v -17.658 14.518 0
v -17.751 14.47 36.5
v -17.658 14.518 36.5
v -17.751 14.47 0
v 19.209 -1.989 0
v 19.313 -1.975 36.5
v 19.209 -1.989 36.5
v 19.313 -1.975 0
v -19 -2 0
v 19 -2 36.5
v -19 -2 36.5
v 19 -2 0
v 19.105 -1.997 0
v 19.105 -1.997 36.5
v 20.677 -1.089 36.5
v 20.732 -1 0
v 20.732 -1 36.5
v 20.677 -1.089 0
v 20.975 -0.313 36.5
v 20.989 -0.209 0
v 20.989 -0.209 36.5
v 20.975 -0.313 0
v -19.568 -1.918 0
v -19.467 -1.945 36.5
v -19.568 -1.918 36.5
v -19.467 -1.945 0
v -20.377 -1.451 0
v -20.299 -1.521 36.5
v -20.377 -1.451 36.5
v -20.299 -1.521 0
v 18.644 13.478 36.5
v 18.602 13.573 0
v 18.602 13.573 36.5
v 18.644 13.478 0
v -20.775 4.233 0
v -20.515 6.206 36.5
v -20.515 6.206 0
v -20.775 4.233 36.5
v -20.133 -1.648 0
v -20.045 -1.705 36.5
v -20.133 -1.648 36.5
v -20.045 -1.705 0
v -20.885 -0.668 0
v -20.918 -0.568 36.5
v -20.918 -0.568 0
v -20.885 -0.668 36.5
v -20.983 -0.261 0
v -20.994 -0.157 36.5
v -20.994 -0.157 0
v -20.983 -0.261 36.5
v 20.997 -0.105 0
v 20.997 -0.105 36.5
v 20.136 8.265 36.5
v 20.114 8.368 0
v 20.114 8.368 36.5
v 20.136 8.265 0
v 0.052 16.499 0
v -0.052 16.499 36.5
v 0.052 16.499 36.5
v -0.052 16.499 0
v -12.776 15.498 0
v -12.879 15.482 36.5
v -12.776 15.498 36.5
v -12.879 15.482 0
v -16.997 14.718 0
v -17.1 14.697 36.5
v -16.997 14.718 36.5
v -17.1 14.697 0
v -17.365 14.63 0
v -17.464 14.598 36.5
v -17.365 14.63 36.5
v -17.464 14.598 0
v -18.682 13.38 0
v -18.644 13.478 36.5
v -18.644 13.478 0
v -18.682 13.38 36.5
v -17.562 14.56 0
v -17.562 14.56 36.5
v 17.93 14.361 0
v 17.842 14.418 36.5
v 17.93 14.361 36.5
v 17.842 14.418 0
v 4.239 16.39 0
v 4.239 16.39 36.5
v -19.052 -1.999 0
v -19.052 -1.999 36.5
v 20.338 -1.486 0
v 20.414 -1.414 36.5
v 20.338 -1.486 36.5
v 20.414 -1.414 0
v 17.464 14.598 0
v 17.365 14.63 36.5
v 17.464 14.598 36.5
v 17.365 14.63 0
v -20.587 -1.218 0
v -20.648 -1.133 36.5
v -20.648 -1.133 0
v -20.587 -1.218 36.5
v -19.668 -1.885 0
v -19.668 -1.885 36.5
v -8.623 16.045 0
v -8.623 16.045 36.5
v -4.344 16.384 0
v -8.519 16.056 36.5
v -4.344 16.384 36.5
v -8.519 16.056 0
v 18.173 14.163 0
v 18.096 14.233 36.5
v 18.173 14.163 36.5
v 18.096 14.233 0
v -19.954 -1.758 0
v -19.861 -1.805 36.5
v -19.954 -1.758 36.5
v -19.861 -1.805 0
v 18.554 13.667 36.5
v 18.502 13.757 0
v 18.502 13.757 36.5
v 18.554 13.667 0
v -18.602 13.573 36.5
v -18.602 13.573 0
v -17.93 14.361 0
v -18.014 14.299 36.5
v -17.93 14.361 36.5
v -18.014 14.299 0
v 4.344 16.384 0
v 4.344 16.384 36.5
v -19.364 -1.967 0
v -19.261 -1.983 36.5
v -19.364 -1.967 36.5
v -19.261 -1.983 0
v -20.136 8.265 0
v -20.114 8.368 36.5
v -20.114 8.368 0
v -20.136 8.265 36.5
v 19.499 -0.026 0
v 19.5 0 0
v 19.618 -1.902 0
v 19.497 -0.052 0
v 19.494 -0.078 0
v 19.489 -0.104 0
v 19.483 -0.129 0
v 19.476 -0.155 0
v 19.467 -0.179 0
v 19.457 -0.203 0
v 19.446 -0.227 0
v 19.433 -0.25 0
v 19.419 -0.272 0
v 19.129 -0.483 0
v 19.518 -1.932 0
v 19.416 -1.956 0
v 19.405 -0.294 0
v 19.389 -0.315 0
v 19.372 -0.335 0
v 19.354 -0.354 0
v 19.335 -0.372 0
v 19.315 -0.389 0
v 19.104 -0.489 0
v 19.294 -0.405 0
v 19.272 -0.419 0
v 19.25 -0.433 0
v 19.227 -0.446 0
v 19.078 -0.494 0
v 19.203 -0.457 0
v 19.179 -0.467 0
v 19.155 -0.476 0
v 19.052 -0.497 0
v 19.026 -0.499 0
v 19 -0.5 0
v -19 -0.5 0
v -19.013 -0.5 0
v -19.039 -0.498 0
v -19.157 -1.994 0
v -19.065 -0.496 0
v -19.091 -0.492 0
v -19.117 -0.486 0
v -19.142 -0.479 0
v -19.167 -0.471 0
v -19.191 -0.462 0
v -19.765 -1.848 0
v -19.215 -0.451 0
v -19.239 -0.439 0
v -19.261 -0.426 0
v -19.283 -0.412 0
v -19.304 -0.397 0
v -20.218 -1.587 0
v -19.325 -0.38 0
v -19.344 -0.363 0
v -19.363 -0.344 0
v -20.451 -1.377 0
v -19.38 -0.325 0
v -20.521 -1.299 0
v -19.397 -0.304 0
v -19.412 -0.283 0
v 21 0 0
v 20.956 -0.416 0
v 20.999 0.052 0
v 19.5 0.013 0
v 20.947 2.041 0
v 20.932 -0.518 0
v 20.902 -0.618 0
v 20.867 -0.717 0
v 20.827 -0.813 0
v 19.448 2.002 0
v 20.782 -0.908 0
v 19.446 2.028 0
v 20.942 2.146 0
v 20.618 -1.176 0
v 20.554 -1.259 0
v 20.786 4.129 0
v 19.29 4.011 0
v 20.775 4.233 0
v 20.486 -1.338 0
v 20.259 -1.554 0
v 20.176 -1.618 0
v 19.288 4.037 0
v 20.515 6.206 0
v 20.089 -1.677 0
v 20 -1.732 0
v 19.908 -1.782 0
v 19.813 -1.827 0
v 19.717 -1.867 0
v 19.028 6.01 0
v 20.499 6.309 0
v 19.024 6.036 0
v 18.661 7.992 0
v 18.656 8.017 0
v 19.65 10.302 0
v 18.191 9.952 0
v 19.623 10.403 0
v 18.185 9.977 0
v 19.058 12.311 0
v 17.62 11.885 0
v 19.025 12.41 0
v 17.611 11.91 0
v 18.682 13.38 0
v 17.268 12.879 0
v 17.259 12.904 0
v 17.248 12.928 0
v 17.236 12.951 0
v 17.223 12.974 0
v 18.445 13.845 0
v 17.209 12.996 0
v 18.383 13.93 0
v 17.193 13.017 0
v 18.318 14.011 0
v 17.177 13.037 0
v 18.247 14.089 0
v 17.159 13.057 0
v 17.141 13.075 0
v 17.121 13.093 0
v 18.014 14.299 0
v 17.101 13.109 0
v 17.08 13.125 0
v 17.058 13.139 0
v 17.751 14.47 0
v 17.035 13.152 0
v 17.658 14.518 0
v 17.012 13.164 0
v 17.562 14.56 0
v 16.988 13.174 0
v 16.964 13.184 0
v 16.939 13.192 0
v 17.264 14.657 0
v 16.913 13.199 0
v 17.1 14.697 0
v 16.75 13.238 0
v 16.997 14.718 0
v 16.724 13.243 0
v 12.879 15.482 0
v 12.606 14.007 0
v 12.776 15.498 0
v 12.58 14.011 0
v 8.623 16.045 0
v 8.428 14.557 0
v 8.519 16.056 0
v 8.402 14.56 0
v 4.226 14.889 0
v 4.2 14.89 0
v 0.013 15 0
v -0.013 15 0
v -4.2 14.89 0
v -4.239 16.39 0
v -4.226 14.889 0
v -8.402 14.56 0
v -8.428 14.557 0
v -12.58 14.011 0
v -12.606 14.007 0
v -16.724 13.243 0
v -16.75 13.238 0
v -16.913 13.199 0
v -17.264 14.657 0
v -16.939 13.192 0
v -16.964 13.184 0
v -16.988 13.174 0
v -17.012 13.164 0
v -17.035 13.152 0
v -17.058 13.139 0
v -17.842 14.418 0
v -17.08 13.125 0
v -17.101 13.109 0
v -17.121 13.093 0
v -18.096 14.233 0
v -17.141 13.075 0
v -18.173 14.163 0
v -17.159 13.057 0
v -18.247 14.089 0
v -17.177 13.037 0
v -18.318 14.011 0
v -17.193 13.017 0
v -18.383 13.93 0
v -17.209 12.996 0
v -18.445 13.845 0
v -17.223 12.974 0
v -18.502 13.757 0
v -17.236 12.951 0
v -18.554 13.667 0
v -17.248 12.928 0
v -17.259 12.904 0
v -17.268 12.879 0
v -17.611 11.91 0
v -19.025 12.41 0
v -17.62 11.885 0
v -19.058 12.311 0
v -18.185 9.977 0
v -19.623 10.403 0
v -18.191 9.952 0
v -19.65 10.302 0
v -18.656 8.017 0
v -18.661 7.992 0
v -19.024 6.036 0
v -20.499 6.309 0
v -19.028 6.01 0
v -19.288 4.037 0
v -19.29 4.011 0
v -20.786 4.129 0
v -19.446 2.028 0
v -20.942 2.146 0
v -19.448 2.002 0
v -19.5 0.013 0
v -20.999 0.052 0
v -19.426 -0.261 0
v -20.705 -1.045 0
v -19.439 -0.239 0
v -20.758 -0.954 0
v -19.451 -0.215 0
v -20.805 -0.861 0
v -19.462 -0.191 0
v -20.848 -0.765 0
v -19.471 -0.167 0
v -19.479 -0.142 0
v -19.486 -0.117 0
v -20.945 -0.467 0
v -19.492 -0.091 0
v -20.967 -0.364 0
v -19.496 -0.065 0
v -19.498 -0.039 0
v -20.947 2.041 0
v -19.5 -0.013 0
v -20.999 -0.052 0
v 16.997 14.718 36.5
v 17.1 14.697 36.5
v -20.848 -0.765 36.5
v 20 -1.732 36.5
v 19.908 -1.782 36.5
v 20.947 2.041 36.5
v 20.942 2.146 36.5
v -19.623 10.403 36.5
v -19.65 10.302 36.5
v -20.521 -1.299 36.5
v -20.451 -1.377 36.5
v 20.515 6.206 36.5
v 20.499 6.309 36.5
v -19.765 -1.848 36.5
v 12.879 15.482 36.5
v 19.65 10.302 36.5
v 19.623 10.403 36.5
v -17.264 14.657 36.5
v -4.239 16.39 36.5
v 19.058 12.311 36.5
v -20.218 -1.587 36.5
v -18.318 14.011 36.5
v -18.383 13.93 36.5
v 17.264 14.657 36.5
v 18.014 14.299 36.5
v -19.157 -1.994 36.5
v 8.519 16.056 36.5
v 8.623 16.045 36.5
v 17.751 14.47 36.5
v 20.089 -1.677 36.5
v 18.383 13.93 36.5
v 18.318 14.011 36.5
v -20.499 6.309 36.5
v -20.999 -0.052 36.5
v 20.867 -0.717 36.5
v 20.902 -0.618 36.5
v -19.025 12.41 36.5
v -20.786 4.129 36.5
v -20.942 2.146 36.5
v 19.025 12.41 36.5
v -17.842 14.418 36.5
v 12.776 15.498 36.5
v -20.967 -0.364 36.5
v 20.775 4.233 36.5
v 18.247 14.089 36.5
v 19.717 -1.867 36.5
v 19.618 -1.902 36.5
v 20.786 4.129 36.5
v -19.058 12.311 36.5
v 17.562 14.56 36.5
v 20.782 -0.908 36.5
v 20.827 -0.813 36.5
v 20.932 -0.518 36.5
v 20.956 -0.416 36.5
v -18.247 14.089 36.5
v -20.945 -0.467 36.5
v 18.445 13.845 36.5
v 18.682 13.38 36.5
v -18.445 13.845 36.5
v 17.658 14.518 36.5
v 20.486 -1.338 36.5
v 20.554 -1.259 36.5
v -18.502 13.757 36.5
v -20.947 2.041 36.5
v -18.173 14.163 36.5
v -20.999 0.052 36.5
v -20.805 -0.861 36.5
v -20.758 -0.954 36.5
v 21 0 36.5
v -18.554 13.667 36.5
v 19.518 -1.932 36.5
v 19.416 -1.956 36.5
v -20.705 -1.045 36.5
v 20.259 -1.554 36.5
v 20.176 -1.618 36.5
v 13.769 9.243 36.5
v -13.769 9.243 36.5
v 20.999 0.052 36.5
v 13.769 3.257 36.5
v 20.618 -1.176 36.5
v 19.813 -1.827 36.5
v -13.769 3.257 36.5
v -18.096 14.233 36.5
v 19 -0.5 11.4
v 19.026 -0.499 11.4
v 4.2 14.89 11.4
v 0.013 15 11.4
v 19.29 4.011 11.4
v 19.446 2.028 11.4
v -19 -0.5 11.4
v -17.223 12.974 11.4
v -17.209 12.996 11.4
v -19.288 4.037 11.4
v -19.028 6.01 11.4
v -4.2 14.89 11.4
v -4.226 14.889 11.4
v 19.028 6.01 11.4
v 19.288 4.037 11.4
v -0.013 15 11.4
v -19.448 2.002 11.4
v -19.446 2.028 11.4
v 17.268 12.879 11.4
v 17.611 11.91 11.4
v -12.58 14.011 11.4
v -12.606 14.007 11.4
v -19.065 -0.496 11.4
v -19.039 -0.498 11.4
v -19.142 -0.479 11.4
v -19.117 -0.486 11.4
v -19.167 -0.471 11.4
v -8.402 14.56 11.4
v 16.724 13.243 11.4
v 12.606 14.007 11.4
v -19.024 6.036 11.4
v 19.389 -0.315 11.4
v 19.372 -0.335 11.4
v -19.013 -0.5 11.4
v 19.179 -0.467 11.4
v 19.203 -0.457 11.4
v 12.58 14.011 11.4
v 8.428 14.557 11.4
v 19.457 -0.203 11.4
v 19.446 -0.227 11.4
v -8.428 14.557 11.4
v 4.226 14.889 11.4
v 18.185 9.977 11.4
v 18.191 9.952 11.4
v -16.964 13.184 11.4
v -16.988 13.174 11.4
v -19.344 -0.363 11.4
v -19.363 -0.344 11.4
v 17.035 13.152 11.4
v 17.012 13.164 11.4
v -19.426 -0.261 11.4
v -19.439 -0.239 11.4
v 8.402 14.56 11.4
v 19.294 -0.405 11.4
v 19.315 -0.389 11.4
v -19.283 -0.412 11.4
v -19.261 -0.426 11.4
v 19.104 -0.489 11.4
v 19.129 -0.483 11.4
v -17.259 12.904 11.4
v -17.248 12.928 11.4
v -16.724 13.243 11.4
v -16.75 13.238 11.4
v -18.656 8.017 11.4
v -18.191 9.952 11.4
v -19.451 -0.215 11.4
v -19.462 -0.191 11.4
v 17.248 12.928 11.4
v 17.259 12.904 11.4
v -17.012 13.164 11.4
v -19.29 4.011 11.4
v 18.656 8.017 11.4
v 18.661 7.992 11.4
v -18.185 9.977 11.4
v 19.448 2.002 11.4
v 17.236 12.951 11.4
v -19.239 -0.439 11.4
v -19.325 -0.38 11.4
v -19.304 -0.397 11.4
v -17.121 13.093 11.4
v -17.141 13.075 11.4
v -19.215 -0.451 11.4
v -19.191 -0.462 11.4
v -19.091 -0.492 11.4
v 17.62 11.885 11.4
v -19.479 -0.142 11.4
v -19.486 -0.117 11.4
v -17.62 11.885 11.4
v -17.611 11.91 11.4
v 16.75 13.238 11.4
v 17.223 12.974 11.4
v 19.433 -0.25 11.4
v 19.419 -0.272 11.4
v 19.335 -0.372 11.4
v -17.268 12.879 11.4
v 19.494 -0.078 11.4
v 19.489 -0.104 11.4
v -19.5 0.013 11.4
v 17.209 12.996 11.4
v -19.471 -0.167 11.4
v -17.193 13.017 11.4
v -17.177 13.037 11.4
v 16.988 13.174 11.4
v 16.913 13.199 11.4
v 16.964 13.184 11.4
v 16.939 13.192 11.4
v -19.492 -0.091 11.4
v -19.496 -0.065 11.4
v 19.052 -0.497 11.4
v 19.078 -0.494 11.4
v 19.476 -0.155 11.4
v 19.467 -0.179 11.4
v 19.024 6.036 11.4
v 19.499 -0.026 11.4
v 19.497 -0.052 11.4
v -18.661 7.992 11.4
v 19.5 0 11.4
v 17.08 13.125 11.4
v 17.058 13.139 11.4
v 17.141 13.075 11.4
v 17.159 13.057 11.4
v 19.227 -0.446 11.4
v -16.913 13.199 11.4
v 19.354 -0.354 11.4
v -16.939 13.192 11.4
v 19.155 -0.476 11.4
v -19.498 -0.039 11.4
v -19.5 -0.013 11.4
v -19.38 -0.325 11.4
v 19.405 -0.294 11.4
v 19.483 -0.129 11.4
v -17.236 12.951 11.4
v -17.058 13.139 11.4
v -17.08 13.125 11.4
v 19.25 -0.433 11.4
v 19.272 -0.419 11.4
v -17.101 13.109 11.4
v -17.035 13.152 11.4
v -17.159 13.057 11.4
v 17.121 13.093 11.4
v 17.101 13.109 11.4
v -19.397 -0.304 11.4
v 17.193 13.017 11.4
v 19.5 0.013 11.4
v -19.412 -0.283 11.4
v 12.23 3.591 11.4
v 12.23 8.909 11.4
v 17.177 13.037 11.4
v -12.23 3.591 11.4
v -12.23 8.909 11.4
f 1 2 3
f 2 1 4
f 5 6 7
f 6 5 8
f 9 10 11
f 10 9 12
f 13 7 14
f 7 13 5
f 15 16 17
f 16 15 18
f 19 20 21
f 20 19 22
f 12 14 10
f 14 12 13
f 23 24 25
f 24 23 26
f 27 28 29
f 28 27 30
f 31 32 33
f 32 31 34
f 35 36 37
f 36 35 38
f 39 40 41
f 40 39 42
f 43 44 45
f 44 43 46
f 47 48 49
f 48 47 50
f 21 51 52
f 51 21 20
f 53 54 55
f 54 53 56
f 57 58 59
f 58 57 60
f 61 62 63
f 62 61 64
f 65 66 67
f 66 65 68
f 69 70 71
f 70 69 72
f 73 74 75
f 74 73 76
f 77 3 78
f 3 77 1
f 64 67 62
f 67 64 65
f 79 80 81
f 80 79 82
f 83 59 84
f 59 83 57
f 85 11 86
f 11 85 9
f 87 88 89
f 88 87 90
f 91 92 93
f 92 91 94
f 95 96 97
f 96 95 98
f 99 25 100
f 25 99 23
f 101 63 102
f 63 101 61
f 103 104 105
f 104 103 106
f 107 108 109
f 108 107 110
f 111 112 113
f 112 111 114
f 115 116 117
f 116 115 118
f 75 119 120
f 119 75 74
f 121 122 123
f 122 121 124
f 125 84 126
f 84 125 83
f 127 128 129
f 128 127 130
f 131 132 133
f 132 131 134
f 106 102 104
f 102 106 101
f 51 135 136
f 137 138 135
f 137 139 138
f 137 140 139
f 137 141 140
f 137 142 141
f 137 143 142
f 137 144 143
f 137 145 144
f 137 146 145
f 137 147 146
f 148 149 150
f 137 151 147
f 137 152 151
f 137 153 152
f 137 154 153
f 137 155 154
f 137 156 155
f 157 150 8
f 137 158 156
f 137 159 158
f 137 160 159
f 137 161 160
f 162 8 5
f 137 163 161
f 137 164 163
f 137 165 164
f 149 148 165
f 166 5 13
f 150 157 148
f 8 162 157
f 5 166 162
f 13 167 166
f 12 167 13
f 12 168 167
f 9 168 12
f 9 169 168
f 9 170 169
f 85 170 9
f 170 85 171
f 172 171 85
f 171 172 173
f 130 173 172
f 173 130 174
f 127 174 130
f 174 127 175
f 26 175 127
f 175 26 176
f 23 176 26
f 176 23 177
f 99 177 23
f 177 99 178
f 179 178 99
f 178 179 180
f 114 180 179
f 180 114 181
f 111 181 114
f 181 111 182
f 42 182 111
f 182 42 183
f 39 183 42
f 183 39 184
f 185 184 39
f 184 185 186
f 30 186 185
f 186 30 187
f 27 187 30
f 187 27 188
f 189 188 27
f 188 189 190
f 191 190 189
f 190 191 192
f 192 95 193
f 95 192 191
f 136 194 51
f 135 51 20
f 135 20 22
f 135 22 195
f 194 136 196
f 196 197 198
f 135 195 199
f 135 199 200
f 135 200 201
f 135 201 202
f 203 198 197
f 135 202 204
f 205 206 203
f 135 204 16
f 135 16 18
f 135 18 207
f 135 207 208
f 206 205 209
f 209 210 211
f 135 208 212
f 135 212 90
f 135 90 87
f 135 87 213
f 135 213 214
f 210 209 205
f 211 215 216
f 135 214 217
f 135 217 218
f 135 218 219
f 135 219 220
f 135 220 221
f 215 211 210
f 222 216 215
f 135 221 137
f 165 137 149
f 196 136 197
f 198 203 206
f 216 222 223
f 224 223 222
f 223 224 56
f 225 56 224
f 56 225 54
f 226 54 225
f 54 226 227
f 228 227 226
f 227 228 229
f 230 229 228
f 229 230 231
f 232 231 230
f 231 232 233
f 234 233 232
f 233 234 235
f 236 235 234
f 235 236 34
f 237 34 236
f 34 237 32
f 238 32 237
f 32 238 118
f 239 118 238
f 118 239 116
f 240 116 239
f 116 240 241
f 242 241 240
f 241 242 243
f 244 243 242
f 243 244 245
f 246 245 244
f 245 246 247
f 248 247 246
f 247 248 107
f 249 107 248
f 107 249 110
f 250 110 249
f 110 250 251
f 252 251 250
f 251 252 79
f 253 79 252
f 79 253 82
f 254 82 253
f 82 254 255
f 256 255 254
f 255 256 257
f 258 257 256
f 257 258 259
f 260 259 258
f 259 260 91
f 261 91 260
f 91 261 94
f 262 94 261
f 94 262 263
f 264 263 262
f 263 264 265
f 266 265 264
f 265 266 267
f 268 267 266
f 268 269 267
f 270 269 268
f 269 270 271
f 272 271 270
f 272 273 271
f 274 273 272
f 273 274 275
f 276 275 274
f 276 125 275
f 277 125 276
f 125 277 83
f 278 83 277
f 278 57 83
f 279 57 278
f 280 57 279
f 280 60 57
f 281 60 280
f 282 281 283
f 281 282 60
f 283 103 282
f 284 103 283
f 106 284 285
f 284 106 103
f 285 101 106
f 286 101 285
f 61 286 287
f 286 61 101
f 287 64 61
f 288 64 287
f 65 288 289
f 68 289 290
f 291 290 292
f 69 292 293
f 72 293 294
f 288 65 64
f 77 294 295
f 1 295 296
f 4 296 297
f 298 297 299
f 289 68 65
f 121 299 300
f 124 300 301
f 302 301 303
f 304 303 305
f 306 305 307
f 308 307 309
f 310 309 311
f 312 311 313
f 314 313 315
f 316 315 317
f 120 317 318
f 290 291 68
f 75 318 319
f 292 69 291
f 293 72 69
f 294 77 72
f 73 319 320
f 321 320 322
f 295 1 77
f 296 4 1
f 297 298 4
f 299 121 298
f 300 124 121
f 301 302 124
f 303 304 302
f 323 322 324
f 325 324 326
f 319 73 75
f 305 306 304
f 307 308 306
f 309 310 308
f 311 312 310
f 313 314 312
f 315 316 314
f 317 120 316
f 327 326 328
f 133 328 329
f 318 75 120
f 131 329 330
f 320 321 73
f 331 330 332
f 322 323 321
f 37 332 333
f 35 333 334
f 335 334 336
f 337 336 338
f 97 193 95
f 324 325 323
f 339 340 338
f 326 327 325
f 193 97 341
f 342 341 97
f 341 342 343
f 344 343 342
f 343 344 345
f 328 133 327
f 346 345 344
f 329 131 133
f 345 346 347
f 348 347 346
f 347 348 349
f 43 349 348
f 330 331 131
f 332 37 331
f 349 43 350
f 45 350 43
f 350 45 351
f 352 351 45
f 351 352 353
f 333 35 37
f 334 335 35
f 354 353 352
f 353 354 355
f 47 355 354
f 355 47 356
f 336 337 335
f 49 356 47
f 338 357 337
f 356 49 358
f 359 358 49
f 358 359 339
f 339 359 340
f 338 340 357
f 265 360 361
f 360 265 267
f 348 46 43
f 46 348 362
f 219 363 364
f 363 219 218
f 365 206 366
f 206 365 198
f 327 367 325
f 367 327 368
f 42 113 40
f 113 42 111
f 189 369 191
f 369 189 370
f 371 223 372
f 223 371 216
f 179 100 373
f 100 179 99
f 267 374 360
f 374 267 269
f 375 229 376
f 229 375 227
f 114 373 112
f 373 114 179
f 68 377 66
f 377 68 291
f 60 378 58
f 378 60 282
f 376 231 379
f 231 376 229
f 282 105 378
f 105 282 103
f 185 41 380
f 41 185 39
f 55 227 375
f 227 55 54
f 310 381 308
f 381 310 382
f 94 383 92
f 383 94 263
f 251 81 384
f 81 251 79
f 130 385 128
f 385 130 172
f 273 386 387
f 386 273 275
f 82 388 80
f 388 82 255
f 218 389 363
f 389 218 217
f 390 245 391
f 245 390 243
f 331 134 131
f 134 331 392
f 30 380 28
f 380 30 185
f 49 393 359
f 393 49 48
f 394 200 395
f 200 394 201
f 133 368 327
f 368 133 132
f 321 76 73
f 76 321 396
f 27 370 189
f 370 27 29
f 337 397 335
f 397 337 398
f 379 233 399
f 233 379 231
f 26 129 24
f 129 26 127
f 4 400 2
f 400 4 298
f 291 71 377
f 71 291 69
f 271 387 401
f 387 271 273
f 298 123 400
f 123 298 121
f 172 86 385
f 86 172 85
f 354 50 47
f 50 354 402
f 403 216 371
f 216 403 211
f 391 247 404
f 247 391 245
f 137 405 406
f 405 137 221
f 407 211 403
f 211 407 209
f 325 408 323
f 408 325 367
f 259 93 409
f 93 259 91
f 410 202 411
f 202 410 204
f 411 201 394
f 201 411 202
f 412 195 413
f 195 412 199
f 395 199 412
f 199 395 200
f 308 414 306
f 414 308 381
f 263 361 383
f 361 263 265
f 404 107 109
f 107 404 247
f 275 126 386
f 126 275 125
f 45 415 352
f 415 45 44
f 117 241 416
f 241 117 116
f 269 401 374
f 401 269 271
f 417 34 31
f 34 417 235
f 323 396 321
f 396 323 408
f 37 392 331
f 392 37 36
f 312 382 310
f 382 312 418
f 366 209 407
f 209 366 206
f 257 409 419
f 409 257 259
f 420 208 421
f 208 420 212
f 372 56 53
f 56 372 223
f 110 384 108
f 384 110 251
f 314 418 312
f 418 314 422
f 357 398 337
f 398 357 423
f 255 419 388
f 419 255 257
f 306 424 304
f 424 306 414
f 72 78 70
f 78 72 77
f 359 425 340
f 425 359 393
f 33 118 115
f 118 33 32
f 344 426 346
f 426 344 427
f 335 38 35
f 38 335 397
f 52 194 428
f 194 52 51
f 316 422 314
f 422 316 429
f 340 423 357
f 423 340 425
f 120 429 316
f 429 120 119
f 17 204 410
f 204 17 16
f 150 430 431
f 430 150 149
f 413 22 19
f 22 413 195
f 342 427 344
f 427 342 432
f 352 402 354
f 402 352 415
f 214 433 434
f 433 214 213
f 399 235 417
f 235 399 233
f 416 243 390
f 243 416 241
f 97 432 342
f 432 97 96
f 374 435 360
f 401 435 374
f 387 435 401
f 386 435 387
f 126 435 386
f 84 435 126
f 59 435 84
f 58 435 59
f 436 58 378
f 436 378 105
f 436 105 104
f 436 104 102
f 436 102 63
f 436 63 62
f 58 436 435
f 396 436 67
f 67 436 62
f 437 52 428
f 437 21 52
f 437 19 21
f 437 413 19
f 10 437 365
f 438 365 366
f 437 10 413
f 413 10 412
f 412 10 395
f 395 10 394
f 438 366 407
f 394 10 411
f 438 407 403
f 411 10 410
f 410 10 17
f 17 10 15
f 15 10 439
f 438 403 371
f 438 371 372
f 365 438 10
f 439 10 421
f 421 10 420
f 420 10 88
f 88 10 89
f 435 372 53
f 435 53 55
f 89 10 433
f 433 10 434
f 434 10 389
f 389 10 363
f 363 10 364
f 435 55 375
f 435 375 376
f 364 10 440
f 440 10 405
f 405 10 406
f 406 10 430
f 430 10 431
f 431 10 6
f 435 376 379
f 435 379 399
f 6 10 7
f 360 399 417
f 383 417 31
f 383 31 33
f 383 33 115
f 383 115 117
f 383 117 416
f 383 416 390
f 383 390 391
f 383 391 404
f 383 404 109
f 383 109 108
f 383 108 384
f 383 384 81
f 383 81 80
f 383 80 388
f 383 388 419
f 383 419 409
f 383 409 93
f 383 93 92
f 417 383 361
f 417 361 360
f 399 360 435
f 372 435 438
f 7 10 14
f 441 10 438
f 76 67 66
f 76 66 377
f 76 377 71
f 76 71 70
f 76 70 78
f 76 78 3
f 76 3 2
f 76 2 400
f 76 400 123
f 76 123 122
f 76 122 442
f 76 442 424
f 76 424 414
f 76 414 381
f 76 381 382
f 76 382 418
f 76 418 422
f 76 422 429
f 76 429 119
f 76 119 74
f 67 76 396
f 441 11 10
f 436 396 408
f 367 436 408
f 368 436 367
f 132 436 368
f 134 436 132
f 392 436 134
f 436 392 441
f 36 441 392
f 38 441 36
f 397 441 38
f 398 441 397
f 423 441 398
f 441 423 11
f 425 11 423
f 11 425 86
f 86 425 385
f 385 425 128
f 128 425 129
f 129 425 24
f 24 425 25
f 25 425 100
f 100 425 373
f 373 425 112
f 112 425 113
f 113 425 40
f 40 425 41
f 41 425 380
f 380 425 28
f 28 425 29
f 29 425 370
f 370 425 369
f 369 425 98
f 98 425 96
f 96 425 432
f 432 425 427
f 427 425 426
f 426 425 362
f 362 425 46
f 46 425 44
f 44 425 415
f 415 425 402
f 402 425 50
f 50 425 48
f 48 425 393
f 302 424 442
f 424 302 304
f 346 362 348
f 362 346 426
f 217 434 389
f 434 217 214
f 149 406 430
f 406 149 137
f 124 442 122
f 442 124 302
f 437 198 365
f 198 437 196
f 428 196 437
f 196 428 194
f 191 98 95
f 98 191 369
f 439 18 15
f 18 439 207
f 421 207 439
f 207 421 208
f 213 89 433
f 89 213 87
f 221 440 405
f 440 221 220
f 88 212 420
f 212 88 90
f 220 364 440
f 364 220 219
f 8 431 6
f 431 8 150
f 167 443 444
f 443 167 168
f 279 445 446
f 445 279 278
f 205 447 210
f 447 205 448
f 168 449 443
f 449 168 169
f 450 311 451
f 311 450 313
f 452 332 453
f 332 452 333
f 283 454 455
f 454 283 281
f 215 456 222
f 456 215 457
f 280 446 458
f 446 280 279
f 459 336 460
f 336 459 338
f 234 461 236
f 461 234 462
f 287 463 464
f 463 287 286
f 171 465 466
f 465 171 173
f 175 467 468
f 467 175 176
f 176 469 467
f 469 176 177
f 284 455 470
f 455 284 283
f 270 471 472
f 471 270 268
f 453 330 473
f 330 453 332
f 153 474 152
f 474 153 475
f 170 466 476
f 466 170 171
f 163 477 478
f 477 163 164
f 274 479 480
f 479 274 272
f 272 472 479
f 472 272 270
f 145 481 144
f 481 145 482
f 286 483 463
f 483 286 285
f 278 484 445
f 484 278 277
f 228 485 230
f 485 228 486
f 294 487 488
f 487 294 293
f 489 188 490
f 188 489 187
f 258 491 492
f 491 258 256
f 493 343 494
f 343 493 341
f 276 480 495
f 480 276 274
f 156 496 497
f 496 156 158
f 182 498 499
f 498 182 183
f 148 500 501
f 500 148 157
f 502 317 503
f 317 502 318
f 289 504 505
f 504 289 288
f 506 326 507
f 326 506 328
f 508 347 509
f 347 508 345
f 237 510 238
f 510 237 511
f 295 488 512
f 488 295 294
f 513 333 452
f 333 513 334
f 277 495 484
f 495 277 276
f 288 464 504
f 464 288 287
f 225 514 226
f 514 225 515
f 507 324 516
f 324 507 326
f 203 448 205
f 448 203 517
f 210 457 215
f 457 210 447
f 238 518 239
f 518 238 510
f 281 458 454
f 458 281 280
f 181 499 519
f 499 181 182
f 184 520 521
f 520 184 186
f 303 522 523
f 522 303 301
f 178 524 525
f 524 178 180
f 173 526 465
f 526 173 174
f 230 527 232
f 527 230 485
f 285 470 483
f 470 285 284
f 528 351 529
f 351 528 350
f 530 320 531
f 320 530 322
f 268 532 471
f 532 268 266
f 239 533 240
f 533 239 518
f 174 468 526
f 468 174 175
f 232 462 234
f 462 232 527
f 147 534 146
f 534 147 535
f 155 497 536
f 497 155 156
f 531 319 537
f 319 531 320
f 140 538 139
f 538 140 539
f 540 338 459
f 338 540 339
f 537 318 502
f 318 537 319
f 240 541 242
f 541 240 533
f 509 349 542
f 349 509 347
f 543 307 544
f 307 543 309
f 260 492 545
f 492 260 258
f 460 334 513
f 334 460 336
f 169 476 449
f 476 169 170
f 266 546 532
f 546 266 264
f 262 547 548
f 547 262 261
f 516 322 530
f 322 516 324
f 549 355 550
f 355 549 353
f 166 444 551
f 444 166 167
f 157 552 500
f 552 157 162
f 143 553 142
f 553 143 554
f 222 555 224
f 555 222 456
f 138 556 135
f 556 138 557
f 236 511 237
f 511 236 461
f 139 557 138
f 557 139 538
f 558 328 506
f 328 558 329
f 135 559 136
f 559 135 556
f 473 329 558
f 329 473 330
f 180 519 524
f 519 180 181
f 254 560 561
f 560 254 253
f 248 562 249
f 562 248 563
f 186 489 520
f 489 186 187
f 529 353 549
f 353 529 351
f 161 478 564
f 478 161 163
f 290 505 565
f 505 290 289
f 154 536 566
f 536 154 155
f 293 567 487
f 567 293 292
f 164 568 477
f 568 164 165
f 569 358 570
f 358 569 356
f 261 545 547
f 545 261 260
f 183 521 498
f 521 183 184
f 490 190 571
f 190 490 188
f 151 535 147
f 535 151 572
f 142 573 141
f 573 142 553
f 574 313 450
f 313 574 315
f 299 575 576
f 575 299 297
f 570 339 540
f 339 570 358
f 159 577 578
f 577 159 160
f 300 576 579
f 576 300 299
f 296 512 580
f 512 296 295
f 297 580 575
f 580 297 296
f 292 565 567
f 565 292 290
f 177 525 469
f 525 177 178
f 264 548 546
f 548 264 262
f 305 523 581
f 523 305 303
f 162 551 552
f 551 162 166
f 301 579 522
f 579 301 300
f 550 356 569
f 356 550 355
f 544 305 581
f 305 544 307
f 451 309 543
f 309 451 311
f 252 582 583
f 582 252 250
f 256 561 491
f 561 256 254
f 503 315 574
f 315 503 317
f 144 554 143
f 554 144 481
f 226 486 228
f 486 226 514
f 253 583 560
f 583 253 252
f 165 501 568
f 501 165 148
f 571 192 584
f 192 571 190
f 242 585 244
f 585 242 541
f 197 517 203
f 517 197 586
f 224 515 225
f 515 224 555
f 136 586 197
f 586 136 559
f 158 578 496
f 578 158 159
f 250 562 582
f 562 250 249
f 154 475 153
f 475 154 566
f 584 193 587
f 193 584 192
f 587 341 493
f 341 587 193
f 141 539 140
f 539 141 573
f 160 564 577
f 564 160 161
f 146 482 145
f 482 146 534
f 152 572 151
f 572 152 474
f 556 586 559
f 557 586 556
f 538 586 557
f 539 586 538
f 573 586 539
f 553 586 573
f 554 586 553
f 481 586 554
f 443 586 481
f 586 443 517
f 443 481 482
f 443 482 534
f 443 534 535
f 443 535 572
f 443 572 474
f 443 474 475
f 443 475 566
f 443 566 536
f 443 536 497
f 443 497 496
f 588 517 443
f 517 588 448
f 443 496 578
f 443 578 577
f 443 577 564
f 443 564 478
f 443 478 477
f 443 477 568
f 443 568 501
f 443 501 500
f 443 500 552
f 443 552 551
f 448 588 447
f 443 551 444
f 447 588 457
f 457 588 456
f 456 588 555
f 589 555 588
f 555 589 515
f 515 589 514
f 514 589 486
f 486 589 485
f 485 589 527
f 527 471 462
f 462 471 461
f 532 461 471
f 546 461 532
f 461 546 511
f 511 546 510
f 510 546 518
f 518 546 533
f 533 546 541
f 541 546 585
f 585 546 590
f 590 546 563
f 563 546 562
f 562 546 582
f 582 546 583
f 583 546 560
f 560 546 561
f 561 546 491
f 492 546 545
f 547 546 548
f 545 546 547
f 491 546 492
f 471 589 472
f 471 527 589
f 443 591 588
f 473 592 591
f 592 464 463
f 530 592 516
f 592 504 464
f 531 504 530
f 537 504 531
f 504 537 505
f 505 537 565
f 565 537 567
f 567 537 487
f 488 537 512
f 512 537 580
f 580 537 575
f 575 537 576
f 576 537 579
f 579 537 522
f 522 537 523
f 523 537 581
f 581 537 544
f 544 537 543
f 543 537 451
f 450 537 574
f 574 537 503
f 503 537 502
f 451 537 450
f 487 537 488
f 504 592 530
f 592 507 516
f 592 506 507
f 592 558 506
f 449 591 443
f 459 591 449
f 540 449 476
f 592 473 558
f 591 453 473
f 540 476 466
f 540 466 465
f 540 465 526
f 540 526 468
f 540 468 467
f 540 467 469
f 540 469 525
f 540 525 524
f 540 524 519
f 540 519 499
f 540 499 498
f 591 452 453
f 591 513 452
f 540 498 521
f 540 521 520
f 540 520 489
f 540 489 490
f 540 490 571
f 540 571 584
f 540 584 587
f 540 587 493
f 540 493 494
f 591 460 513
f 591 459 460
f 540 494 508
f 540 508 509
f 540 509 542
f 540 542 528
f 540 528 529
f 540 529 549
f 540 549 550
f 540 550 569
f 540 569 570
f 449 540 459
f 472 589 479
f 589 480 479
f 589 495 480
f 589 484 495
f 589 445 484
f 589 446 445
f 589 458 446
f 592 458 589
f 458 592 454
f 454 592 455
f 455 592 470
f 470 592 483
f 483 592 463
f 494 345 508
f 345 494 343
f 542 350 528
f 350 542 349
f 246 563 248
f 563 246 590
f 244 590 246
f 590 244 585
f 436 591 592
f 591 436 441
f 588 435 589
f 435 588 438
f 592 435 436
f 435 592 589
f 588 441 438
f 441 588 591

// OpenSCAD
/*

A holder for the Eufy H30 brush that came with the motorized brush

*/

$fn = 120;

plug_x = 38;
plug_z = 11.5;
plug_r = 160;

plug_cut_z = 13;
plug_cut_delta = 1.5;

brush_x = 23;
brush_y = 5;
brush_z = 25;

z_total = plug_z + brush_z;


module half_cylinder(diameter, height=plug_z) {
    cut_diameter = diameter + 1;
    difference() {
        cylinder(height, d=diameter);
        translate([-cut_diameter / 2, -diameter, -1])
            cube([cut_diameter, diameter, height + 2]);
    }
}


module separated(diameter, height=plug_z) {
    intersection() {
        translate([(diameter / 2 - plug_x / 2), 0, 0])
            half_cylinder(diameter);
        translate([(-diameter / 2 + plug_x / 2), 0, 0])
            half_cylinder(diameter);
    }
}


module plug_base(x=plug_x, site_r=plug_x*2, top_r=plug_r, height=plug_z) {
    dy = plug_cut_z + plug_cut_delta - top_r / 2;
    intersection() {
        separated(site_r);
        translate([0, dy, 0])
            half_cylinder(top_r);
    }
}


module plug(height, delta=1) {
    linear_extrude(height=height)
        offset(r=delta)
            projection()
                plug_base();
}

difference() {
    plug(z_total, 2);
    translate([0, 0, -.1])
        plug(plug_z, 0.5);
    translate([0, 6.25, z_total / 2])
        linear_extrude(height=z_total + 1, center=true, scale=1.2)
            square([brush_x, brush_y], center=true);
}
